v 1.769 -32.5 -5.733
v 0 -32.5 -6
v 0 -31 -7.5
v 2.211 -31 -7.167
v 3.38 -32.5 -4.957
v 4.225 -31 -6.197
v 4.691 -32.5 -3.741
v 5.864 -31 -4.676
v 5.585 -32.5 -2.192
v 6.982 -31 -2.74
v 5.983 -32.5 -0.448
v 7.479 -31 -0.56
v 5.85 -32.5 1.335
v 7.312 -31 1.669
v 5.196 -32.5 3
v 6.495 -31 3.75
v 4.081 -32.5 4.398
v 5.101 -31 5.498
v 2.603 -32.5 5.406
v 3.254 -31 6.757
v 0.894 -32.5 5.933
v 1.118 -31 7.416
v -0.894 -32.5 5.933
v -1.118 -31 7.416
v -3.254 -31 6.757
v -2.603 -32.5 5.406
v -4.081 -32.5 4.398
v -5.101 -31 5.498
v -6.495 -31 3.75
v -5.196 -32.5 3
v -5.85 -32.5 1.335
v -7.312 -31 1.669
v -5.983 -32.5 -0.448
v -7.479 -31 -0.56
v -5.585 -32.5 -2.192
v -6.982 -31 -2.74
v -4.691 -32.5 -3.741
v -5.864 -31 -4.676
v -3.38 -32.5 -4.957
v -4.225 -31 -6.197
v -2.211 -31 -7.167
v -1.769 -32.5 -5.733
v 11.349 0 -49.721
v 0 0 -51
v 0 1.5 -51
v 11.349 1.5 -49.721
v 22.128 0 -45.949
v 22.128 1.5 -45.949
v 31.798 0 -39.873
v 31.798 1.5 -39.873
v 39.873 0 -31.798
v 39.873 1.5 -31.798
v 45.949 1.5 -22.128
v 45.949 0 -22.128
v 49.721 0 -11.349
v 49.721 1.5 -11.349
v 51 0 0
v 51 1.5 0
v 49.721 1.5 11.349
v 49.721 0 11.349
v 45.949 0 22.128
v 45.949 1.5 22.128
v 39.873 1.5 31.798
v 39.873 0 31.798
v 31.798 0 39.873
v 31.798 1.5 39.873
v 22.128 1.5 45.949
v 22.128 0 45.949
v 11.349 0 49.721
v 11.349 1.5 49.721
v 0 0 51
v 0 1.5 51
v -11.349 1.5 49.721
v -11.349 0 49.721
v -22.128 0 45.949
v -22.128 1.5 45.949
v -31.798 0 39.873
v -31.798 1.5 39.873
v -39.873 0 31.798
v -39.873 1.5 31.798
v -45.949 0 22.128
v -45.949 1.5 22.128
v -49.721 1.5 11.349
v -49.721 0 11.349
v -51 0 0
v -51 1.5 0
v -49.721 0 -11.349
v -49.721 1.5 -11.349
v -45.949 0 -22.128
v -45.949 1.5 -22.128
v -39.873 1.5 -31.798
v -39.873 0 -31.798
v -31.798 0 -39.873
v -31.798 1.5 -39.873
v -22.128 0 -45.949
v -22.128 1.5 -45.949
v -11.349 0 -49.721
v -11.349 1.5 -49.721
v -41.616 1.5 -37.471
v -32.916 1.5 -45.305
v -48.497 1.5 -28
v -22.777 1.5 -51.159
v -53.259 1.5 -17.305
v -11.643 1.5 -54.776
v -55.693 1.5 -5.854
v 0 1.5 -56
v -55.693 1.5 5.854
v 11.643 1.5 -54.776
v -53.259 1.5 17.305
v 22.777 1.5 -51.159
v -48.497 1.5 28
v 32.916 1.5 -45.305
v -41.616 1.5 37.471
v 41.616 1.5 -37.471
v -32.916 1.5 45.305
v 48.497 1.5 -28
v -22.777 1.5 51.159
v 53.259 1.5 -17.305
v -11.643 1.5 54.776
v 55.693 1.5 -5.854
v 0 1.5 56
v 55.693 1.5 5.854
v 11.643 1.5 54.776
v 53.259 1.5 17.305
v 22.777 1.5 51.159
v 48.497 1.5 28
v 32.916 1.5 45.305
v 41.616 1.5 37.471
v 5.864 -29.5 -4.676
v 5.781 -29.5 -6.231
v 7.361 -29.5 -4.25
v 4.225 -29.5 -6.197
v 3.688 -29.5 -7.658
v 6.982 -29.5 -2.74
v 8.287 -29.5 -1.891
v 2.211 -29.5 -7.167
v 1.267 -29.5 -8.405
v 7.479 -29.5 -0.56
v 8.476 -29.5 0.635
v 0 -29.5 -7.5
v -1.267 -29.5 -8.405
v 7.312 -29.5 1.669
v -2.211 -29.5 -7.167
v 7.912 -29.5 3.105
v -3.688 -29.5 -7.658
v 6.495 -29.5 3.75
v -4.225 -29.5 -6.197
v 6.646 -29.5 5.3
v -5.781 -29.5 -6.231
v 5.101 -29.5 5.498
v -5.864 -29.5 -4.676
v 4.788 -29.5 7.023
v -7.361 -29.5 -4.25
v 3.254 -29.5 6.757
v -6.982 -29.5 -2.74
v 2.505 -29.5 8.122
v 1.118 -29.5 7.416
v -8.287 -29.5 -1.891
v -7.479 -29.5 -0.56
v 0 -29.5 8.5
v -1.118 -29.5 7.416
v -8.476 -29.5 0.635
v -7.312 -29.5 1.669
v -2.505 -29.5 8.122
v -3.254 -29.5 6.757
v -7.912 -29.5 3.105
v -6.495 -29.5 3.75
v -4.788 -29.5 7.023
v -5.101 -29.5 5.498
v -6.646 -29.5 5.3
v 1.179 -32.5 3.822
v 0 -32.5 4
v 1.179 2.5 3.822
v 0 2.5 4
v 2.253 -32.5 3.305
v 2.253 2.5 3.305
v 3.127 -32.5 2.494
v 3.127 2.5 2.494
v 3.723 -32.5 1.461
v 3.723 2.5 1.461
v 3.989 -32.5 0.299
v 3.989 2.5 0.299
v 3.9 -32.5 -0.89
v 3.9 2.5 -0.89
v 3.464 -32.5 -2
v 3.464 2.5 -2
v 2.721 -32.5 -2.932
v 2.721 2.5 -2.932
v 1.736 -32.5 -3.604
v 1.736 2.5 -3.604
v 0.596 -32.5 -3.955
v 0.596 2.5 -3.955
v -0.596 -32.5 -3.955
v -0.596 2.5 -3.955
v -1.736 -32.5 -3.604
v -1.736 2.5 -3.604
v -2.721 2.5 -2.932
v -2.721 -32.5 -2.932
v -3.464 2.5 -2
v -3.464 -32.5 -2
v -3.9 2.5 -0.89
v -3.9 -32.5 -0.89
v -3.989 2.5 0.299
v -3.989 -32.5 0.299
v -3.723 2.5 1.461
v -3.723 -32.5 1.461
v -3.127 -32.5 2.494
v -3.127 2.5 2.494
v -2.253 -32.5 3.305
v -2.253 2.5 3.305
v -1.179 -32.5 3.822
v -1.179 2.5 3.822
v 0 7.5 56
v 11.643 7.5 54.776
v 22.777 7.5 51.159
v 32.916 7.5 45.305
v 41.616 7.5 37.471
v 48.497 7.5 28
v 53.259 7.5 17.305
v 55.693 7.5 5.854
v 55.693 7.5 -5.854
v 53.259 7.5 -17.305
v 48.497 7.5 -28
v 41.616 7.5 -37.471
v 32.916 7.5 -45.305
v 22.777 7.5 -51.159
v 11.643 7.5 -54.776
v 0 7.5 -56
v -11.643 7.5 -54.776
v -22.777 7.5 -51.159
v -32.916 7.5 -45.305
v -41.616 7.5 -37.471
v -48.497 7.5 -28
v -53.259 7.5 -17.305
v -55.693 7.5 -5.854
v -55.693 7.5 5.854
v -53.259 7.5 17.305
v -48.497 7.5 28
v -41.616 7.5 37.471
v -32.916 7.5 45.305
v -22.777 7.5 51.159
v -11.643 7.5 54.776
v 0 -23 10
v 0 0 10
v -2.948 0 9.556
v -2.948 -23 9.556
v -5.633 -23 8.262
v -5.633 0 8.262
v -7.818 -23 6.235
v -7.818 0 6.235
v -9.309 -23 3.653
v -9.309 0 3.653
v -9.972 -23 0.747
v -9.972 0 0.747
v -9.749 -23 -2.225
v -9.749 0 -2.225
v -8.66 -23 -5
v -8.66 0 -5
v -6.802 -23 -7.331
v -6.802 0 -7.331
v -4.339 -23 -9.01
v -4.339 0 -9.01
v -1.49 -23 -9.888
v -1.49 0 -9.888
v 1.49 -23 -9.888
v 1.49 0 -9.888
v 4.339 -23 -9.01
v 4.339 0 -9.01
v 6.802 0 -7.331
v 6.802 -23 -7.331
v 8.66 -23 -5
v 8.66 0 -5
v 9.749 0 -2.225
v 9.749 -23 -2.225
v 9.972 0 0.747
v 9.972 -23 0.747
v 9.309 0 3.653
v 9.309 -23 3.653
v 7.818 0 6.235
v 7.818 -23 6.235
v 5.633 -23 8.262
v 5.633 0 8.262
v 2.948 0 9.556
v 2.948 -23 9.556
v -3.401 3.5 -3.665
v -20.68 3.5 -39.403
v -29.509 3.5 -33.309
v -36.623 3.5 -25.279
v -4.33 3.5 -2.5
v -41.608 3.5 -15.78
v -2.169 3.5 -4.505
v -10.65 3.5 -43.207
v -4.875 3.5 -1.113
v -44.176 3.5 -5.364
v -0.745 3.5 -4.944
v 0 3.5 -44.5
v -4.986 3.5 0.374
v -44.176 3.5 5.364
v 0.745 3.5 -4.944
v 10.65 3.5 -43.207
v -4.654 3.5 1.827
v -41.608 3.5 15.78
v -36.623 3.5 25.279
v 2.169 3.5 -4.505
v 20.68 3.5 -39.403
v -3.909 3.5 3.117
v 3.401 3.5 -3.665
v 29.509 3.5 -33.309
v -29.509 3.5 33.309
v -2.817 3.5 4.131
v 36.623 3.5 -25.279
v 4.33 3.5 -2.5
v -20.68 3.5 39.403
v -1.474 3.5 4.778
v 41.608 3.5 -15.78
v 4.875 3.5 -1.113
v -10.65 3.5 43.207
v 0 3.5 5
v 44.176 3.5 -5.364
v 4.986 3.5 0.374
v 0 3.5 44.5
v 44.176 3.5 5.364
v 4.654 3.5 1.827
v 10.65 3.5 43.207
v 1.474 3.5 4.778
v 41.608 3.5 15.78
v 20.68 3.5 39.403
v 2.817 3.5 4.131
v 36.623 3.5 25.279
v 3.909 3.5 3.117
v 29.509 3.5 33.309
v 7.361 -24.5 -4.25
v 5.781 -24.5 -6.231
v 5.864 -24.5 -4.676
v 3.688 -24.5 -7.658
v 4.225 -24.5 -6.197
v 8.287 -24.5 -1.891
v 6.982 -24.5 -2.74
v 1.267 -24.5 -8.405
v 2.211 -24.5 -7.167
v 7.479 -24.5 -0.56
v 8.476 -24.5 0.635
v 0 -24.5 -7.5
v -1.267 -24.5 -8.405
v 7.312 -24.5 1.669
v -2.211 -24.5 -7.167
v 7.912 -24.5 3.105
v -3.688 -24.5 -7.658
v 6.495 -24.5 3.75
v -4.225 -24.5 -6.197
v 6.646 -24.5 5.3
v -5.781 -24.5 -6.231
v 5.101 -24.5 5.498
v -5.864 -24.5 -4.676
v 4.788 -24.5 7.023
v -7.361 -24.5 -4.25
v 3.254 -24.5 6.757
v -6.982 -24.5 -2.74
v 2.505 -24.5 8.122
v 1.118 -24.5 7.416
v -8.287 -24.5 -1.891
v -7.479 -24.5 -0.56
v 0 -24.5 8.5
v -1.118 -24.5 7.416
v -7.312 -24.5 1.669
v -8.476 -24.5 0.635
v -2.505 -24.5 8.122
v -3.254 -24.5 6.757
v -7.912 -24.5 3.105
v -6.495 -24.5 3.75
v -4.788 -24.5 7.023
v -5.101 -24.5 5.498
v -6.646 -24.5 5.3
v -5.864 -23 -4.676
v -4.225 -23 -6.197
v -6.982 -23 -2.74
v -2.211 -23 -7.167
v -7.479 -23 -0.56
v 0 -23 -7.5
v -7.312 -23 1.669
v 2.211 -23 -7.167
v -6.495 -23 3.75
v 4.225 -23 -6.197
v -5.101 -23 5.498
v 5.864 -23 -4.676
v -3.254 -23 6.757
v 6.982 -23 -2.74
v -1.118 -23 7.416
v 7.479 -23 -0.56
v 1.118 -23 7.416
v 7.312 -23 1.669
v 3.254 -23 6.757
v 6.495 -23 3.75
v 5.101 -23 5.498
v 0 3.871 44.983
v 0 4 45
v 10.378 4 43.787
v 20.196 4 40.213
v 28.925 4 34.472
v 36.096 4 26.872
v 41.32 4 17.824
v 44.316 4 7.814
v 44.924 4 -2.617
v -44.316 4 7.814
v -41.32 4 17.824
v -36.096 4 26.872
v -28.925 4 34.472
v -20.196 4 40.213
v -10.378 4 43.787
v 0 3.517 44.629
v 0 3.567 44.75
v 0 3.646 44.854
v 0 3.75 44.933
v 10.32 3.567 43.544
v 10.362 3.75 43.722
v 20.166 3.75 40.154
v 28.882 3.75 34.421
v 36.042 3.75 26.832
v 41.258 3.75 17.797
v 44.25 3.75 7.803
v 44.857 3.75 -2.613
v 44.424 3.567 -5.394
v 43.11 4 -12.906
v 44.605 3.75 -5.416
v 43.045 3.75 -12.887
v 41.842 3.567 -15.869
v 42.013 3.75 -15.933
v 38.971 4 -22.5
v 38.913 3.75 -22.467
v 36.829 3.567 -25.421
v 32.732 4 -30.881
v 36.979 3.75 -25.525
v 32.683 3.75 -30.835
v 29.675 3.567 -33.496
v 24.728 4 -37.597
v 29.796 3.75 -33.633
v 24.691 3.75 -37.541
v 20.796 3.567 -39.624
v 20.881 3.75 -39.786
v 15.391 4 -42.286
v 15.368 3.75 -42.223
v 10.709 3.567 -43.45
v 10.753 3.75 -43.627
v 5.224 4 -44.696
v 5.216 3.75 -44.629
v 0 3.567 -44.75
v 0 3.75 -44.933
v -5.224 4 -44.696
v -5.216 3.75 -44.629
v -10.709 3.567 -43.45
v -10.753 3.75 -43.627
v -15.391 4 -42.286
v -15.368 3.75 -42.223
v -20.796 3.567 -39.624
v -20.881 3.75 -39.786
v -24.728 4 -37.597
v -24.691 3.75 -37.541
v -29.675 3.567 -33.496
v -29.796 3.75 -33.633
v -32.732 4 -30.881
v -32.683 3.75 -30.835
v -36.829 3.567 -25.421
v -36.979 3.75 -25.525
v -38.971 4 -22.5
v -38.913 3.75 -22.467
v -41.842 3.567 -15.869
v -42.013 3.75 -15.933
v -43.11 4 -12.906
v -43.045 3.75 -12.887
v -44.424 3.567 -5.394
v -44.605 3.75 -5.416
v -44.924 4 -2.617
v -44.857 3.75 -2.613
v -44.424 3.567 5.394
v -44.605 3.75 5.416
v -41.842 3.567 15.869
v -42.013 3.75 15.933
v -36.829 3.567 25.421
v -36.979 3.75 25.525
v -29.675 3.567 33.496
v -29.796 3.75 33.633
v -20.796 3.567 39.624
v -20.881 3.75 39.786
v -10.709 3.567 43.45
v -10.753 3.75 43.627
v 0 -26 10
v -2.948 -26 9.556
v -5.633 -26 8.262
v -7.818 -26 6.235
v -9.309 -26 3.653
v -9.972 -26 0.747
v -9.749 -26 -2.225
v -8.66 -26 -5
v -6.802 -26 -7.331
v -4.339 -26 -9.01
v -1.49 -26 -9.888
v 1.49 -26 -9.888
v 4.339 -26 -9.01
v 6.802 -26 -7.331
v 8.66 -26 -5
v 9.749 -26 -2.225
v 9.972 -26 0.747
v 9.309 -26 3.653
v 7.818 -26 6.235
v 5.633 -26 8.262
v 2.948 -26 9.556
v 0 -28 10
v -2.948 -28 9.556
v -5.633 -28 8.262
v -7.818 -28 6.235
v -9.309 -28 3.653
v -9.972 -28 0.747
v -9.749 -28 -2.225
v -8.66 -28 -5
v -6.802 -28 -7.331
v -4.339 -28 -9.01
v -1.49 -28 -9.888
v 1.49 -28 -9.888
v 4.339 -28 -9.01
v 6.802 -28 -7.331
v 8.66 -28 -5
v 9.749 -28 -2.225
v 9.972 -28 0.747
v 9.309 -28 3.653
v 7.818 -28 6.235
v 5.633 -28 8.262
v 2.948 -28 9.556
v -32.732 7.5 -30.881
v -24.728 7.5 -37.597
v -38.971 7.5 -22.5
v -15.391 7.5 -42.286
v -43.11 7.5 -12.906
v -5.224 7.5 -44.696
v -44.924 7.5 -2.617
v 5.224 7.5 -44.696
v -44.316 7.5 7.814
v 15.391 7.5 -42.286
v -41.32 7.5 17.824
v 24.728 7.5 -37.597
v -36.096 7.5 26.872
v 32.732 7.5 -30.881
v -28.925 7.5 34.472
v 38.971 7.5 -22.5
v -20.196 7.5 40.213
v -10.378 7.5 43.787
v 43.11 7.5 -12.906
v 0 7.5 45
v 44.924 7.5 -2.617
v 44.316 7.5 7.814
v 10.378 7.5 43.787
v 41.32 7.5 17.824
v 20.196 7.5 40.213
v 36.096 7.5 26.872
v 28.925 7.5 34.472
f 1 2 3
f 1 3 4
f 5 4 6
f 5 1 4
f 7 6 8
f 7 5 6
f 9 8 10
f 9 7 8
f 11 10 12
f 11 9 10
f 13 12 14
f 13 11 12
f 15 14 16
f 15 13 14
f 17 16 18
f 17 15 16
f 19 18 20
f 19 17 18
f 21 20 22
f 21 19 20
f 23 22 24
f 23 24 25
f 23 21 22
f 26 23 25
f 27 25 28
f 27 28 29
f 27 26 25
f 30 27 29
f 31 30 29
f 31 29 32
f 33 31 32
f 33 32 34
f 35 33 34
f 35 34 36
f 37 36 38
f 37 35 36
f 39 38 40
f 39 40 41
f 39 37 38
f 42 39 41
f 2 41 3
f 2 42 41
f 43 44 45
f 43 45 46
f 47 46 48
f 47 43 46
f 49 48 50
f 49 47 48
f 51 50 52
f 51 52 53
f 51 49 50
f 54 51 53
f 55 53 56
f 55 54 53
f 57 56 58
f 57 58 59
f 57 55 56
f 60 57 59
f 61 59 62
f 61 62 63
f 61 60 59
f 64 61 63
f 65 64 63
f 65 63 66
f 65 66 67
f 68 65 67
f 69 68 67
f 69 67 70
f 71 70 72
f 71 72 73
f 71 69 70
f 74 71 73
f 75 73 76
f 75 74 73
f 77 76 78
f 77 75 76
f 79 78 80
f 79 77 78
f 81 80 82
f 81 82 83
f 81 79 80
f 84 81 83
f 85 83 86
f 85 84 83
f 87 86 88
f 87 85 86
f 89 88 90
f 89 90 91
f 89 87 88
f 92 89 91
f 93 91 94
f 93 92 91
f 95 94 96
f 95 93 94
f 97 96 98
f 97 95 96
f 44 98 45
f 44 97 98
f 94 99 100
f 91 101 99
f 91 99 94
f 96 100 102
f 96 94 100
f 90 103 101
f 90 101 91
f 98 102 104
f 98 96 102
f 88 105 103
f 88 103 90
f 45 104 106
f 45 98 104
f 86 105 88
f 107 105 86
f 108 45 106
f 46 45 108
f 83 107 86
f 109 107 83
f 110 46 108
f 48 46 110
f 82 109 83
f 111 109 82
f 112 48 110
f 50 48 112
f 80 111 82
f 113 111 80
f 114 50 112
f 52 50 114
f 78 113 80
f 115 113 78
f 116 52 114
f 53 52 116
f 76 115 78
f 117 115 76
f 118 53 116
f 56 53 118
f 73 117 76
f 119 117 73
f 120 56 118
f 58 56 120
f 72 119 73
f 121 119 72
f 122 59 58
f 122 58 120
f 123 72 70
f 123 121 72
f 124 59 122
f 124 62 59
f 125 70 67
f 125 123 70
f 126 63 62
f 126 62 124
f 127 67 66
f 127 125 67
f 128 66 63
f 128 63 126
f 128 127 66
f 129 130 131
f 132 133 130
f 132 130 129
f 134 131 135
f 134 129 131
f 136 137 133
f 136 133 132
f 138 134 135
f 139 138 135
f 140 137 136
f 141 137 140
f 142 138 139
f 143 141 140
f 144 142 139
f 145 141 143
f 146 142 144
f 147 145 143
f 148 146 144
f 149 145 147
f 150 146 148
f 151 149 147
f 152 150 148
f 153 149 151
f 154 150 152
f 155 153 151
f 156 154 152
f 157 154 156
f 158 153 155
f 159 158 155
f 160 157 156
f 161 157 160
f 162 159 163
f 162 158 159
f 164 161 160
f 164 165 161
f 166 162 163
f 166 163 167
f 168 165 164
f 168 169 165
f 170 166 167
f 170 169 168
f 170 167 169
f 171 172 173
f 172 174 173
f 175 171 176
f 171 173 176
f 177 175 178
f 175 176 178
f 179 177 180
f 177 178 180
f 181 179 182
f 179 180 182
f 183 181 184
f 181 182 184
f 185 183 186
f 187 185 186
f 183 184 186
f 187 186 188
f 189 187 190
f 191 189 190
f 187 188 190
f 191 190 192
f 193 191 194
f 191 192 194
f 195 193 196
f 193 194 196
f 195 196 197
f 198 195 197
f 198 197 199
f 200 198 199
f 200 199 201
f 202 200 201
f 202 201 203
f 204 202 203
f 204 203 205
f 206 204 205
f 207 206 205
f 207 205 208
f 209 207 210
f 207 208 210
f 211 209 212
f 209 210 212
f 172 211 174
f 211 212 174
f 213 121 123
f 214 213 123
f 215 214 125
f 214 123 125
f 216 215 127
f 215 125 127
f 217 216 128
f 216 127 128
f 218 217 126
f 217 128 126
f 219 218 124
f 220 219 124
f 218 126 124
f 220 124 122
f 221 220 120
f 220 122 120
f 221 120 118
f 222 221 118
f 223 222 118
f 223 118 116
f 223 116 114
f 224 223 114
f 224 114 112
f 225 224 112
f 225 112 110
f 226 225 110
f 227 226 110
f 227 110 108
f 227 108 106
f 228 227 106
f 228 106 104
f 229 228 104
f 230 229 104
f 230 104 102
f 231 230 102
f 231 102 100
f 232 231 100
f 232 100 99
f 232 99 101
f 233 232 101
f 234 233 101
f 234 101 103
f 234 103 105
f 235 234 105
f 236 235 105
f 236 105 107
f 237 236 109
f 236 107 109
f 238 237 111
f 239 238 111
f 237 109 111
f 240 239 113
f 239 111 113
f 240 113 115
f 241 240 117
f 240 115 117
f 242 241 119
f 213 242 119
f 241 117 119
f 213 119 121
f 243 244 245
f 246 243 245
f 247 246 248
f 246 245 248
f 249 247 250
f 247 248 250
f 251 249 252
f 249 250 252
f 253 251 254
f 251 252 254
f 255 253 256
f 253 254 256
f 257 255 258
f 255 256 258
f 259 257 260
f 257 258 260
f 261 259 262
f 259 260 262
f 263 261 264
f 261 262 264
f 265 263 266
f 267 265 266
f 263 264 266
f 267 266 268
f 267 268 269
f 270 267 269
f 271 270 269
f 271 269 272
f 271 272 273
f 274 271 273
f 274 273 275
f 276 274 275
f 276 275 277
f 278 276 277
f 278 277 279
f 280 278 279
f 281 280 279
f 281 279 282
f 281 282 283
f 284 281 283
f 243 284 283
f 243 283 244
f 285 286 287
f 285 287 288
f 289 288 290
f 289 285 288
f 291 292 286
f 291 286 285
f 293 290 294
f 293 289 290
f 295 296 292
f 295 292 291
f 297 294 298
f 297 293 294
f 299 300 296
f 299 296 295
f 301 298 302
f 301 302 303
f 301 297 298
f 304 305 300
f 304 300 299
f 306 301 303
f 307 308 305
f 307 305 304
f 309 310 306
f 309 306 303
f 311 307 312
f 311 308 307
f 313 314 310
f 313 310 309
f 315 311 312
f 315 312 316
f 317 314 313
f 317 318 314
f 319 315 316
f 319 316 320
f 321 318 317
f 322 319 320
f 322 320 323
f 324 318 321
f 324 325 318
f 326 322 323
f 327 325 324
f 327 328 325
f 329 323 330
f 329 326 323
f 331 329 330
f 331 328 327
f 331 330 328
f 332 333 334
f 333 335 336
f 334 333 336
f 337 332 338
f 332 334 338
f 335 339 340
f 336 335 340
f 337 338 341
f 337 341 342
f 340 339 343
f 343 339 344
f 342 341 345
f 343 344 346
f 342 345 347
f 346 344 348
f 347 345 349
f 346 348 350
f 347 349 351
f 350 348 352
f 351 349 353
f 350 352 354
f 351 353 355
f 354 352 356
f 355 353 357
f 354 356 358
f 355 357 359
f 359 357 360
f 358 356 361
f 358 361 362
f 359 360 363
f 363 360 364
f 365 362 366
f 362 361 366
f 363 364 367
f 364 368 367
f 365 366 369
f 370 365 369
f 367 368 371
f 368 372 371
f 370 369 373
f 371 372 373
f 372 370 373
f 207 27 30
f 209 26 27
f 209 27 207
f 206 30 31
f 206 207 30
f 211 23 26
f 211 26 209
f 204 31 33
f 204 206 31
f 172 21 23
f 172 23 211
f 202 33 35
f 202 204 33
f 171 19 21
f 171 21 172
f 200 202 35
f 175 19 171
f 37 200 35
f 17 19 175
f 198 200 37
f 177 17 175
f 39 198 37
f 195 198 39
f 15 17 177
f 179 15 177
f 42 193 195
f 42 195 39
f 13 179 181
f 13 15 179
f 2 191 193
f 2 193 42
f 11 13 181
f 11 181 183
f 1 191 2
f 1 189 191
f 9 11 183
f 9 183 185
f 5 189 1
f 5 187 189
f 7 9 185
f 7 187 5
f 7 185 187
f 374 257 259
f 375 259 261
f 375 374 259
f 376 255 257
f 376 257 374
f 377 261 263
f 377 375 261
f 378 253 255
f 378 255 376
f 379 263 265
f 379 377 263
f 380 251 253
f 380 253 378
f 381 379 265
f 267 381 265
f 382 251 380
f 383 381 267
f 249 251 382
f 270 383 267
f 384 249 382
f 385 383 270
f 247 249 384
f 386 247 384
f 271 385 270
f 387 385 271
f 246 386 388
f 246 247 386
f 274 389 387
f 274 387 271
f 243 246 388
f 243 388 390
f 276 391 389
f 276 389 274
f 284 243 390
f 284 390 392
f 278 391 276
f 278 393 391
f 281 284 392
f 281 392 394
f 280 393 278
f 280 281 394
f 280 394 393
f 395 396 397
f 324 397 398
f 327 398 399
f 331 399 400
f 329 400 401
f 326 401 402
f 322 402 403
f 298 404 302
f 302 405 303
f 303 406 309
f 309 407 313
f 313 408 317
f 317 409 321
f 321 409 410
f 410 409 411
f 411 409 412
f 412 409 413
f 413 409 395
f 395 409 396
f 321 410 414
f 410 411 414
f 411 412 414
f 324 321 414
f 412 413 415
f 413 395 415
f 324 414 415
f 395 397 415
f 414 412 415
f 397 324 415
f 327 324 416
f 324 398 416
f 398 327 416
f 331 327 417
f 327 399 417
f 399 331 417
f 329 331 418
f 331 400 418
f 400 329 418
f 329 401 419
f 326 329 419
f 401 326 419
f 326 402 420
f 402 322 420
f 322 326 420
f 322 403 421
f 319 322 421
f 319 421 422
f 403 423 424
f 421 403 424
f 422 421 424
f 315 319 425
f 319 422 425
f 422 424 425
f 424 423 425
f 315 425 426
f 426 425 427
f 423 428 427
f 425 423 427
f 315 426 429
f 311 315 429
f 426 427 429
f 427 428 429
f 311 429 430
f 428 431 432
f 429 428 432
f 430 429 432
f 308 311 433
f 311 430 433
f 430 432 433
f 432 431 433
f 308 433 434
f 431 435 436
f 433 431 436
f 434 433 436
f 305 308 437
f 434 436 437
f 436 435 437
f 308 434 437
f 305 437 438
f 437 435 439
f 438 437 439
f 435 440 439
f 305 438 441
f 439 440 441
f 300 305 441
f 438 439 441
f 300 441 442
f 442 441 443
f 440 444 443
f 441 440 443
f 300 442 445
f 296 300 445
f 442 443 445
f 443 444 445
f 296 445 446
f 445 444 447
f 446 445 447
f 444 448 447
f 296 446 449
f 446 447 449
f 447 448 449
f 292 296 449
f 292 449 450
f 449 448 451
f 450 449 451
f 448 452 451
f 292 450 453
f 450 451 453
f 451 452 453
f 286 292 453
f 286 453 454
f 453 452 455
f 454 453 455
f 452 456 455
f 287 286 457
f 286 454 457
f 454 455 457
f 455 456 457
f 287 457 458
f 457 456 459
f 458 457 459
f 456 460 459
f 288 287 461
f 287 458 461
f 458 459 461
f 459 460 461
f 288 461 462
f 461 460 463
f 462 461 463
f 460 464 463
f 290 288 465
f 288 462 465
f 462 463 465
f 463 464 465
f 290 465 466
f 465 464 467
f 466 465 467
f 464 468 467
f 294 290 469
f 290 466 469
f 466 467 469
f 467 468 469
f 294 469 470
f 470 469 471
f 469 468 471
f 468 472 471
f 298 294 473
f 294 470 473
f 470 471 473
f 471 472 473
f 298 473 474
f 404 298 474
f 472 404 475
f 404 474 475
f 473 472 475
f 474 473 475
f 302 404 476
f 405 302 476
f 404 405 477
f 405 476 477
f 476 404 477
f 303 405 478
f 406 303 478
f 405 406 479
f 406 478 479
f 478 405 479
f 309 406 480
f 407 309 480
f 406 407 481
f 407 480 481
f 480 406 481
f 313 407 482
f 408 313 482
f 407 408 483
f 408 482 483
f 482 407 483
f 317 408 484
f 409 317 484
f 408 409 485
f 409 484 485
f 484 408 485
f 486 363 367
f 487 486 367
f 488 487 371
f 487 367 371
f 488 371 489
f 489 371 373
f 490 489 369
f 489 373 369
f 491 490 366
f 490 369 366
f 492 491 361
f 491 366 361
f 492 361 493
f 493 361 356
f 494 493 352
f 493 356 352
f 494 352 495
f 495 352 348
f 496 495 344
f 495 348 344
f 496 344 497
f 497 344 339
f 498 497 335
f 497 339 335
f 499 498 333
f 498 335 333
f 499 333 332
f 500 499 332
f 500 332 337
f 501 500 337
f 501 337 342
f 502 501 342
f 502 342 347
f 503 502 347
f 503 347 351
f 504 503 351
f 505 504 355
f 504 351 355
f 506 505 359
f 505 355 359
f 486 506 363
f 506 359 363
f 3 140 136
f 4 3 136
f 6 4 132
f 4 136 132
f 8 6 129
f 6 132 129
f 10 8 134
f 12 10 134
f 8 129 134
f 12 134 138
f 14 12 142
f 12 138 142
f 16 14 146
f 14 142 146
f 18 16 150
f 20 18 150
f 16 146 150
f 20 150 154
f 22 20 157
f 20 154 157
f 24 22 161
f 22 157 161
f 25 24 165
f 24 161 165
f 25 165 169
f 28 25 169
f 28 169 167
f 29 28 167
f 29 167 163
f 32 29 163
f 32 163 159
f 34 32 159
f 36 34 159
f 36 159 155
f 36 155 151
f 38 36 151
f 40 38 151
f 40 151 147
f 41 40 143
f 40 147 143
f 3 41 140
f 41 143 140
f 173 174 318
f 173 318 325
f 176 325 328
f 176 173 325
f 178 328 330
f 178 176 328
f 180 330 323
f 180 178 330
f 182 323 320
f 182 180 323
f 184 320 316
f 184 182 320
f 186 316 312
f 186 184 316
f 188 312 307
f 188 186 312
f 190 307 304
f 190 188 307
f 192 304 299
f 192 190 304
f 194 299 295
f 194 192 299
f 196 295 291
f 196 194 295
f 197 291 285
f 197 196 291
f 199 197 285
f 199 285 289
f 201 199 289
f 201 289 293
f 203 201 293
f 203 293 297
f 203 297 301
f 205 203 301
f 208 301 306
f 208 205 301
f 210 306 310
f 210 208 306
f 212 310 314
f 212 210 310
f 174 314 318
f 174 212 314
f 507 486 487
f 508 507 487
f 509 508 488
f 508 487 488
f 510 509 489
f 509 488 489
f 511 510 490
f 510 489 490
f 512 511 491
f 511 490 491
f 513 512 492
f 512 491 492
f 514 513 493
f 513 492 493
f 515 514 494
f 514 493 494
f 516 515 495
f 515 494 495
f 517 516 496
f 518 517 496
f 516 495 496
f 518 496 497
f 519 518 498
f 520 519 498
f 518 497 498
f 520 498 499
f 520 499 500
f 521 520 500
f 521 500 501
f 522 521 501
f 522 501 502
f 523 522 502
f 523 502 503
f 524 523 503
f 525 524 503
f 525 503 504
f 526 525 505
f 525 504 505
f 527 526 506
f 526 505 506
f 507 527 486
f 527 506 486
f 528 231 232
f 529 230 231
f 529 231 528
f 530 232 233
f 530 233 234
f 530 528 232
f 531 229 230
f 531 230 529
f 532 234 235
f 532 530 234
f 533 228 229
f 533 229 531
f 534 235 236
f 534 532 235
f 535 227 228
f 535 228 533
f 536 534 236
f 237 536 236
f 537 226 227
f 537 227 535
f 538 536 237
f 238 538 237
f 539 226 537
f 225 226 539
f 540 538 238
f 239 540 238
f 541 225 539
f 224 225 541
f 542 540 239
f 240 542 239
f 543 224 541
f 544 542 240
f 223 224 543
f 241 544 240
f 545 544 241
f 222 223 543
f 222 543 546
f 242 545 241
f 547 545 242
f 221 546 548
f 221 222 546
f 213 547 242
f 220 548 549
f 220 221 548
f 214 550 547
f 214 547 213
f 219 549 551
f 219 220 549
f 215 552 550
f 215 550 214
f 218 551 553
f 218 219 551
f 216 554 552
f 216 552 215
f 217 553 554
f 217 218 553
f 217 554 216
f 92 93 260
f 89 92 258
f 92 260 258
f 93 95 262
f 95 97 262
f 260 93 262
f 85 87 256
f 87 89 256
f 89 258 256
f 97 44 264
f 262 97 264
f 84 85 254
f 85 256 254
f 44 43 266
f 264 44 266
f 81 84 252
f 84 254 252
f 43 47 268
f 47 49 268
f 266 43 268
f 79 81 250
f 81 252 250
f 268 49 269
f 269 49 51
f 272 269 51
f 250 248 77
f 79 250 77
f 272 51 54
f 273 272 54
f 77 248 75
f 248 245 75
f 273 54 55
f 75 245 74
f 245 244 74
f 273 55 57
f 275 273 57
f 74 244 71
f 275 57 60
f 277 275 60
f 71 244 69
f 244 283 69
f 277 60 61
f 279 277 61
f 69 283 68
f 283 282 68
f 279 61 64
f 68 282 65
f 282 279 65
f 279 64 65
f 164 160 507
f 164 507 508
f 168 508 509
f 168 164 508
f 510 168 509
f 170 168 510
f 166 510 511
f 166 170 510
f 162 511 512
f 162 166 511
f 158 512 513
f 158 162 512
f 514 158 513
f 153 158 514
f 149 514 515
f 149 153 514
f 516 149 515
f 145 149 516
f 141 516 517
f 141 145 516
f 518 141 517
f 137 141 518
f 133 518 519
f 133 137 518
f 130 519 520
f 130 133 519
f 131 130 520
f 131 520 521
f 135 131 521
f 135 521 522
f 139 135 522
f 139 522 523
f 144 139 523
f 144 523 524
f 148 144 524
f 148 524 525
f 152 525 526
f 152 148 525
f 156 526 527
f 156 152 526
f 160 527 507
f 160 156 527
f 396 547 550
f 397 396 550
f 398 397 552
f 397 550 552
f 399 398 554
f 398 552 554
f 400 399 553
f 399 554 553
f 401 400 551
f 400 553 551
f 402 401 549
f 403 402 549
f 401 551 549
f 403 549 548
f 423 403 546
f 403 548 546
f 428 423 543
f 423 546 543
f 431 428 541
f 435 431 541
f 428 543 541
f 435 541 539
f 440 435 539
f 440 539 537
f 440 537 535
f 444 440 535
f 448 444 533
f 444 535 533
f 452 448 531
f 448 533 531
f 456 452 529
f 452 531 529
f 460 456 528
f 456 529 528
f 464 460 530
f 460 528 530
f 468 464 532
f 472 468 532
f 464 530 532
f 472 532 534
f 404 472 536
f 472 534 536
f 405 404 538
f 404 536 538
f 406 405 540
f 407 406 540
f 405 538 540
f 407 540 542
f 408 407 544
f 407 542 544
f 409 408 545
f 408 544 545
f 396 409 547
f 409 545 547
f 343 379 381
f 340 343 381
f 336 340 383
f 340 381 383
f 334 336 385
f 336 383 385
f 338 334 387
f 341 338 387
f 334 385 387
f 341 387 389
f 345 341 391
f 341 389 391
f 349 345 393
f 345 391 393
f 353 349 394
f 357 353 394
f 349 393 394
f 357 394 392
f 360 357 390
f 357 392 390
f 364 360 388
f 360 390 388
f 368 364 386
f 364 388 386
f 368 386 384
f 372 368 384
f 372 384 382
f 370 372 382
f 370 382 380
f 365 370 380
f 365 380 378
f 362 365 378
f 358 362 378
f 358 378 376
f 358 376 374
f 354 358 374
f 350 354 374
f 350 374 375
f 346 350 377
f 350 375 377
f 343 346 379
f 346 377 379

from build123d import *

# Parameters (mm, degrees)
SKETCH1_R          = 56
EXTRUDE1_DEPTH     = 7.5
SKETCH2_R          = 10
EXTRUDE5_DEPTH     = 35
SKETCH5_R          = 45
EXTRUDE6_DEPTH     = 4
SKETCH6_R          = 4
EXTRUDE7_DEPTH     = 39.5
CHAMFER3_SIZE      = 1
EXTRUDE8_DEPTH     = 67
EXTRUDE10_DEPTH    = 67
SKETCH10_W         = 20
SKETCH10_H         = 12.483117272
EXTRUDE11_DEPTH    = 67
SKETCH11_R         = 7.5
EXTRUDE12_DEPTH    = 1.5
SKETCH12_R         = 10
EXTRUDE13_DEPTH    = 5
SKETCH13_R         = 7.5
EXTRUDE15_DEPTH    = 3
CHAMFER4_SIZE      = 1.5
CHAMFER6_SIZE      = 1.5
CHAMFER7_SIZE      = 1.5
SKETCH16_R         = 4
EXTRUDE16_DEPTH    = 10.5
SKETCH17_OUTSIDE_W = 146.672
SKETCH17_OUTSIDE_H = 146.672
SKETCH17_OUTSIDE_R = 51
EXTRUDE17_DEPTH    = 1.5
FILLET7_R          = 0.5


with BuildPart() as part:
    # Sketch1 → Extrude1 (new body)
    with BuildSketch(Plane(origin=(0, 0, 0), x_dir=(1, 0, 0), z_dir=(0, 1, 0))):
        with Locations(Location((0, 0, 0), (0, 0, 270))):  # turned: the seam where the file's is
            Circle(SKETCH1_R)
    extrude(amount=EXTRUDE1_DEPTH)

    # Sketch2 → Extrude5 (add)
    with BuildSketch(Plane.XZ):
        with Locations(Location((0, 0, 0), (0, 0, 90))):  # turned: the seam where the file's is
            Circle(SKETCH2_R)
    extrude(amount=EXTRUDE5_DEPTH)

    # Sketch5 → Extrude6 (cut)
    with BuildSketch(Plane(origin=(0, 7.5, 0), x_dir=(1, 0, 0), z_dir=(0, 1, 0))):
        with Locations(Location((0, 0, 0), (0, 0, 270))):  # turned: the seam where the file's is
            Circle(SKETCH5_R)
    extrude(amount=-EXTRUDE6_DEPTH, mode=Mode.SUBTRACT)

    # Sketch6 → Extrude7 (cut, through all)
    with BuildSketch(Plane(origin=(0, 3.5, 0), x_dir=(1, 0, 0), z_dir=(0, 1, 0))):
        with Locations(Location((0, 0, 0), (0, 0, 270))):  # turned: the seam where the file's is
            Circle(SKETCH6_R)
    extrude(amount=-EXTRUDE7_DEPTH, mode=Mode.SUBTRACT)

    # Chamfer3
    chamfer3_edges = [part.edges().sort_by_distance(p)[0] for p in [
        (0, 3.5, -4),
    ]]
    chamfer(chamfer3_edges, length=CHAMFER3_SIZE)

    # Sketch7 → Extrude8 (cut, through all)
    with BuildSketch(Plane.XY.offset(10)):
        Polygon((-10, -23), (-8.939339828, -23), (-8.939339828, -24.689339828), (-10, -25.75), align=None)
    extrude8 = extrude(amount=-EXTRUDE8_DEPTH, mode=Mode.SUBTRACT)

    # Mirror2: Extrude8 across plane
    add(extrude8.mirror(Plane(origin=(0, 0, 0), x_dir=(0, 0, 1), z_dir=(1, 0, 0))), mode=Mode.SUBTRACT)

    # Sketch9 → Extrude10 (cut, through all)
    with BuildSketch(Plane.XY.offset(10)):
        Polygon((-10, -35), (-10, -32.25), (-9.116116524, -33.133883476), (-9.116116524, -34.133883476), (-8.25, -35), align=None)
    extrude10 = extrude(amount=-EXTRUDE10_DEPTH, mode=Mode.SUBTRACT)

    # Mirror3: Extrude10 across plane
    add(extrude10.mirror(Plane(origin=(0, 0, 0), x_dir=(0, 0, 1), z_dir=(1, 0, 0))), mode=Mode.SUBTRACT)

    # Sketch10 → Extrude11 (cut, through all)
    with BuildSketch(Plane.XY.offset(10)):
        with Locations((0, -29.241558636)):
            Rectangle(SKETCH10_W, SKETCH10_H)
    extrude(amount=-EXTRUDE11_DEPTH, mode=Mode.SUBTRACT)

    # Sketch11 → Extrude12 (add)
    with BuildSketch(Plane.XZ.offset(23)):
        with Locations(Location((0, 0, 0), (0, 0, 270))):  # turned: the seam where the file's is
            Circle(SKETCH11_R)
    extrude(amount=EXTRUDE12_DEPTH)

    # Sketch12 → Extrude13 (add)
    with BuildSketch(Plane.XZ.offset(24.5)):
        with Locations(Location((0, 0, 0), (0, 0, 90))):  # turned: the seam where the file's is
            Circle(SKETCH12_R)
    extrude(amount=EXTRUDE13_DEPTH)

    # Sketch13 → Extrude15 (add)
    with BuildSketch(Plane.XZ.offset(29.5)):
        with Locations(Location((0, 0, 0), (0, 0, 270))):  # turned: the seam where the file's is
            Circle(SKETCH13_R)
    extrude(amount=EXTRUDE15_DEPTH)

    # Chamfer4
    chamfer4_edges = [part.edges().sort_by_distance(p)[0] for p in [
        (0, -32.5, 7.5),
    ]]
    chamfer(chamfer4_edges, length=CHAMFER4_SIZE)

    # Chamfer6
    chamfer6_edges = [part.edges().sort_by_distance(p)[0] for p in [
        (0, -24.5, -10),
    ]]
    chamfer(chamfer6_edges, length=CHAMFER6_SIZE)

    # Chamfer7
    chamfer7_edges = [part.edges().sort_by_distance(p)[0] for p in [
        (0, -29.5, -10),
    ]]
    chamfer(chamfer7_edges, length=CHAMFER7_SIZE)

    # Sketch16 → Extrude16 (cut, through all)
    with BuildSketch(Plane(origin=(0, -23, 0), x_dir=(-1, 0, 0), z_dir=(0, 1, 0))):
        with Locations(Location((0, 0, 0), (0, 0, 90))):  # turned: the seam where the file's is
            Circle(SKETCH16_R)
    extrude(amount=-EXTRUDE16_DEPTH, mode=Mode.SUBTRACT)

    # Sketch17 outside → Extrude17 (cut)
    with BuildSketch(Plane.XZ):
        Rectangle(SKETCH17_OUTSIDE_W, SKETCH17_OUTSIDE_H)
        with Locations(Location((0, 0, 0), (0, 0, 270))):  # turned: the seam where the file's is
            Circle(SKETCH17_OUTSIDE_R, mode=Mode.SUBTRACT)
    extrude(amount=-EXTRUDE17_DEPTH, mode=Mode.SUBTRACT)

    # Fillet7
    fillet7_edges = [part.edges().sort_by_distance(p)[0] for p in [
        (0, 3.5, -45),
    ]]
    fillet(fillet7_edges, radius=FILLET7_R)


solid = part.part
